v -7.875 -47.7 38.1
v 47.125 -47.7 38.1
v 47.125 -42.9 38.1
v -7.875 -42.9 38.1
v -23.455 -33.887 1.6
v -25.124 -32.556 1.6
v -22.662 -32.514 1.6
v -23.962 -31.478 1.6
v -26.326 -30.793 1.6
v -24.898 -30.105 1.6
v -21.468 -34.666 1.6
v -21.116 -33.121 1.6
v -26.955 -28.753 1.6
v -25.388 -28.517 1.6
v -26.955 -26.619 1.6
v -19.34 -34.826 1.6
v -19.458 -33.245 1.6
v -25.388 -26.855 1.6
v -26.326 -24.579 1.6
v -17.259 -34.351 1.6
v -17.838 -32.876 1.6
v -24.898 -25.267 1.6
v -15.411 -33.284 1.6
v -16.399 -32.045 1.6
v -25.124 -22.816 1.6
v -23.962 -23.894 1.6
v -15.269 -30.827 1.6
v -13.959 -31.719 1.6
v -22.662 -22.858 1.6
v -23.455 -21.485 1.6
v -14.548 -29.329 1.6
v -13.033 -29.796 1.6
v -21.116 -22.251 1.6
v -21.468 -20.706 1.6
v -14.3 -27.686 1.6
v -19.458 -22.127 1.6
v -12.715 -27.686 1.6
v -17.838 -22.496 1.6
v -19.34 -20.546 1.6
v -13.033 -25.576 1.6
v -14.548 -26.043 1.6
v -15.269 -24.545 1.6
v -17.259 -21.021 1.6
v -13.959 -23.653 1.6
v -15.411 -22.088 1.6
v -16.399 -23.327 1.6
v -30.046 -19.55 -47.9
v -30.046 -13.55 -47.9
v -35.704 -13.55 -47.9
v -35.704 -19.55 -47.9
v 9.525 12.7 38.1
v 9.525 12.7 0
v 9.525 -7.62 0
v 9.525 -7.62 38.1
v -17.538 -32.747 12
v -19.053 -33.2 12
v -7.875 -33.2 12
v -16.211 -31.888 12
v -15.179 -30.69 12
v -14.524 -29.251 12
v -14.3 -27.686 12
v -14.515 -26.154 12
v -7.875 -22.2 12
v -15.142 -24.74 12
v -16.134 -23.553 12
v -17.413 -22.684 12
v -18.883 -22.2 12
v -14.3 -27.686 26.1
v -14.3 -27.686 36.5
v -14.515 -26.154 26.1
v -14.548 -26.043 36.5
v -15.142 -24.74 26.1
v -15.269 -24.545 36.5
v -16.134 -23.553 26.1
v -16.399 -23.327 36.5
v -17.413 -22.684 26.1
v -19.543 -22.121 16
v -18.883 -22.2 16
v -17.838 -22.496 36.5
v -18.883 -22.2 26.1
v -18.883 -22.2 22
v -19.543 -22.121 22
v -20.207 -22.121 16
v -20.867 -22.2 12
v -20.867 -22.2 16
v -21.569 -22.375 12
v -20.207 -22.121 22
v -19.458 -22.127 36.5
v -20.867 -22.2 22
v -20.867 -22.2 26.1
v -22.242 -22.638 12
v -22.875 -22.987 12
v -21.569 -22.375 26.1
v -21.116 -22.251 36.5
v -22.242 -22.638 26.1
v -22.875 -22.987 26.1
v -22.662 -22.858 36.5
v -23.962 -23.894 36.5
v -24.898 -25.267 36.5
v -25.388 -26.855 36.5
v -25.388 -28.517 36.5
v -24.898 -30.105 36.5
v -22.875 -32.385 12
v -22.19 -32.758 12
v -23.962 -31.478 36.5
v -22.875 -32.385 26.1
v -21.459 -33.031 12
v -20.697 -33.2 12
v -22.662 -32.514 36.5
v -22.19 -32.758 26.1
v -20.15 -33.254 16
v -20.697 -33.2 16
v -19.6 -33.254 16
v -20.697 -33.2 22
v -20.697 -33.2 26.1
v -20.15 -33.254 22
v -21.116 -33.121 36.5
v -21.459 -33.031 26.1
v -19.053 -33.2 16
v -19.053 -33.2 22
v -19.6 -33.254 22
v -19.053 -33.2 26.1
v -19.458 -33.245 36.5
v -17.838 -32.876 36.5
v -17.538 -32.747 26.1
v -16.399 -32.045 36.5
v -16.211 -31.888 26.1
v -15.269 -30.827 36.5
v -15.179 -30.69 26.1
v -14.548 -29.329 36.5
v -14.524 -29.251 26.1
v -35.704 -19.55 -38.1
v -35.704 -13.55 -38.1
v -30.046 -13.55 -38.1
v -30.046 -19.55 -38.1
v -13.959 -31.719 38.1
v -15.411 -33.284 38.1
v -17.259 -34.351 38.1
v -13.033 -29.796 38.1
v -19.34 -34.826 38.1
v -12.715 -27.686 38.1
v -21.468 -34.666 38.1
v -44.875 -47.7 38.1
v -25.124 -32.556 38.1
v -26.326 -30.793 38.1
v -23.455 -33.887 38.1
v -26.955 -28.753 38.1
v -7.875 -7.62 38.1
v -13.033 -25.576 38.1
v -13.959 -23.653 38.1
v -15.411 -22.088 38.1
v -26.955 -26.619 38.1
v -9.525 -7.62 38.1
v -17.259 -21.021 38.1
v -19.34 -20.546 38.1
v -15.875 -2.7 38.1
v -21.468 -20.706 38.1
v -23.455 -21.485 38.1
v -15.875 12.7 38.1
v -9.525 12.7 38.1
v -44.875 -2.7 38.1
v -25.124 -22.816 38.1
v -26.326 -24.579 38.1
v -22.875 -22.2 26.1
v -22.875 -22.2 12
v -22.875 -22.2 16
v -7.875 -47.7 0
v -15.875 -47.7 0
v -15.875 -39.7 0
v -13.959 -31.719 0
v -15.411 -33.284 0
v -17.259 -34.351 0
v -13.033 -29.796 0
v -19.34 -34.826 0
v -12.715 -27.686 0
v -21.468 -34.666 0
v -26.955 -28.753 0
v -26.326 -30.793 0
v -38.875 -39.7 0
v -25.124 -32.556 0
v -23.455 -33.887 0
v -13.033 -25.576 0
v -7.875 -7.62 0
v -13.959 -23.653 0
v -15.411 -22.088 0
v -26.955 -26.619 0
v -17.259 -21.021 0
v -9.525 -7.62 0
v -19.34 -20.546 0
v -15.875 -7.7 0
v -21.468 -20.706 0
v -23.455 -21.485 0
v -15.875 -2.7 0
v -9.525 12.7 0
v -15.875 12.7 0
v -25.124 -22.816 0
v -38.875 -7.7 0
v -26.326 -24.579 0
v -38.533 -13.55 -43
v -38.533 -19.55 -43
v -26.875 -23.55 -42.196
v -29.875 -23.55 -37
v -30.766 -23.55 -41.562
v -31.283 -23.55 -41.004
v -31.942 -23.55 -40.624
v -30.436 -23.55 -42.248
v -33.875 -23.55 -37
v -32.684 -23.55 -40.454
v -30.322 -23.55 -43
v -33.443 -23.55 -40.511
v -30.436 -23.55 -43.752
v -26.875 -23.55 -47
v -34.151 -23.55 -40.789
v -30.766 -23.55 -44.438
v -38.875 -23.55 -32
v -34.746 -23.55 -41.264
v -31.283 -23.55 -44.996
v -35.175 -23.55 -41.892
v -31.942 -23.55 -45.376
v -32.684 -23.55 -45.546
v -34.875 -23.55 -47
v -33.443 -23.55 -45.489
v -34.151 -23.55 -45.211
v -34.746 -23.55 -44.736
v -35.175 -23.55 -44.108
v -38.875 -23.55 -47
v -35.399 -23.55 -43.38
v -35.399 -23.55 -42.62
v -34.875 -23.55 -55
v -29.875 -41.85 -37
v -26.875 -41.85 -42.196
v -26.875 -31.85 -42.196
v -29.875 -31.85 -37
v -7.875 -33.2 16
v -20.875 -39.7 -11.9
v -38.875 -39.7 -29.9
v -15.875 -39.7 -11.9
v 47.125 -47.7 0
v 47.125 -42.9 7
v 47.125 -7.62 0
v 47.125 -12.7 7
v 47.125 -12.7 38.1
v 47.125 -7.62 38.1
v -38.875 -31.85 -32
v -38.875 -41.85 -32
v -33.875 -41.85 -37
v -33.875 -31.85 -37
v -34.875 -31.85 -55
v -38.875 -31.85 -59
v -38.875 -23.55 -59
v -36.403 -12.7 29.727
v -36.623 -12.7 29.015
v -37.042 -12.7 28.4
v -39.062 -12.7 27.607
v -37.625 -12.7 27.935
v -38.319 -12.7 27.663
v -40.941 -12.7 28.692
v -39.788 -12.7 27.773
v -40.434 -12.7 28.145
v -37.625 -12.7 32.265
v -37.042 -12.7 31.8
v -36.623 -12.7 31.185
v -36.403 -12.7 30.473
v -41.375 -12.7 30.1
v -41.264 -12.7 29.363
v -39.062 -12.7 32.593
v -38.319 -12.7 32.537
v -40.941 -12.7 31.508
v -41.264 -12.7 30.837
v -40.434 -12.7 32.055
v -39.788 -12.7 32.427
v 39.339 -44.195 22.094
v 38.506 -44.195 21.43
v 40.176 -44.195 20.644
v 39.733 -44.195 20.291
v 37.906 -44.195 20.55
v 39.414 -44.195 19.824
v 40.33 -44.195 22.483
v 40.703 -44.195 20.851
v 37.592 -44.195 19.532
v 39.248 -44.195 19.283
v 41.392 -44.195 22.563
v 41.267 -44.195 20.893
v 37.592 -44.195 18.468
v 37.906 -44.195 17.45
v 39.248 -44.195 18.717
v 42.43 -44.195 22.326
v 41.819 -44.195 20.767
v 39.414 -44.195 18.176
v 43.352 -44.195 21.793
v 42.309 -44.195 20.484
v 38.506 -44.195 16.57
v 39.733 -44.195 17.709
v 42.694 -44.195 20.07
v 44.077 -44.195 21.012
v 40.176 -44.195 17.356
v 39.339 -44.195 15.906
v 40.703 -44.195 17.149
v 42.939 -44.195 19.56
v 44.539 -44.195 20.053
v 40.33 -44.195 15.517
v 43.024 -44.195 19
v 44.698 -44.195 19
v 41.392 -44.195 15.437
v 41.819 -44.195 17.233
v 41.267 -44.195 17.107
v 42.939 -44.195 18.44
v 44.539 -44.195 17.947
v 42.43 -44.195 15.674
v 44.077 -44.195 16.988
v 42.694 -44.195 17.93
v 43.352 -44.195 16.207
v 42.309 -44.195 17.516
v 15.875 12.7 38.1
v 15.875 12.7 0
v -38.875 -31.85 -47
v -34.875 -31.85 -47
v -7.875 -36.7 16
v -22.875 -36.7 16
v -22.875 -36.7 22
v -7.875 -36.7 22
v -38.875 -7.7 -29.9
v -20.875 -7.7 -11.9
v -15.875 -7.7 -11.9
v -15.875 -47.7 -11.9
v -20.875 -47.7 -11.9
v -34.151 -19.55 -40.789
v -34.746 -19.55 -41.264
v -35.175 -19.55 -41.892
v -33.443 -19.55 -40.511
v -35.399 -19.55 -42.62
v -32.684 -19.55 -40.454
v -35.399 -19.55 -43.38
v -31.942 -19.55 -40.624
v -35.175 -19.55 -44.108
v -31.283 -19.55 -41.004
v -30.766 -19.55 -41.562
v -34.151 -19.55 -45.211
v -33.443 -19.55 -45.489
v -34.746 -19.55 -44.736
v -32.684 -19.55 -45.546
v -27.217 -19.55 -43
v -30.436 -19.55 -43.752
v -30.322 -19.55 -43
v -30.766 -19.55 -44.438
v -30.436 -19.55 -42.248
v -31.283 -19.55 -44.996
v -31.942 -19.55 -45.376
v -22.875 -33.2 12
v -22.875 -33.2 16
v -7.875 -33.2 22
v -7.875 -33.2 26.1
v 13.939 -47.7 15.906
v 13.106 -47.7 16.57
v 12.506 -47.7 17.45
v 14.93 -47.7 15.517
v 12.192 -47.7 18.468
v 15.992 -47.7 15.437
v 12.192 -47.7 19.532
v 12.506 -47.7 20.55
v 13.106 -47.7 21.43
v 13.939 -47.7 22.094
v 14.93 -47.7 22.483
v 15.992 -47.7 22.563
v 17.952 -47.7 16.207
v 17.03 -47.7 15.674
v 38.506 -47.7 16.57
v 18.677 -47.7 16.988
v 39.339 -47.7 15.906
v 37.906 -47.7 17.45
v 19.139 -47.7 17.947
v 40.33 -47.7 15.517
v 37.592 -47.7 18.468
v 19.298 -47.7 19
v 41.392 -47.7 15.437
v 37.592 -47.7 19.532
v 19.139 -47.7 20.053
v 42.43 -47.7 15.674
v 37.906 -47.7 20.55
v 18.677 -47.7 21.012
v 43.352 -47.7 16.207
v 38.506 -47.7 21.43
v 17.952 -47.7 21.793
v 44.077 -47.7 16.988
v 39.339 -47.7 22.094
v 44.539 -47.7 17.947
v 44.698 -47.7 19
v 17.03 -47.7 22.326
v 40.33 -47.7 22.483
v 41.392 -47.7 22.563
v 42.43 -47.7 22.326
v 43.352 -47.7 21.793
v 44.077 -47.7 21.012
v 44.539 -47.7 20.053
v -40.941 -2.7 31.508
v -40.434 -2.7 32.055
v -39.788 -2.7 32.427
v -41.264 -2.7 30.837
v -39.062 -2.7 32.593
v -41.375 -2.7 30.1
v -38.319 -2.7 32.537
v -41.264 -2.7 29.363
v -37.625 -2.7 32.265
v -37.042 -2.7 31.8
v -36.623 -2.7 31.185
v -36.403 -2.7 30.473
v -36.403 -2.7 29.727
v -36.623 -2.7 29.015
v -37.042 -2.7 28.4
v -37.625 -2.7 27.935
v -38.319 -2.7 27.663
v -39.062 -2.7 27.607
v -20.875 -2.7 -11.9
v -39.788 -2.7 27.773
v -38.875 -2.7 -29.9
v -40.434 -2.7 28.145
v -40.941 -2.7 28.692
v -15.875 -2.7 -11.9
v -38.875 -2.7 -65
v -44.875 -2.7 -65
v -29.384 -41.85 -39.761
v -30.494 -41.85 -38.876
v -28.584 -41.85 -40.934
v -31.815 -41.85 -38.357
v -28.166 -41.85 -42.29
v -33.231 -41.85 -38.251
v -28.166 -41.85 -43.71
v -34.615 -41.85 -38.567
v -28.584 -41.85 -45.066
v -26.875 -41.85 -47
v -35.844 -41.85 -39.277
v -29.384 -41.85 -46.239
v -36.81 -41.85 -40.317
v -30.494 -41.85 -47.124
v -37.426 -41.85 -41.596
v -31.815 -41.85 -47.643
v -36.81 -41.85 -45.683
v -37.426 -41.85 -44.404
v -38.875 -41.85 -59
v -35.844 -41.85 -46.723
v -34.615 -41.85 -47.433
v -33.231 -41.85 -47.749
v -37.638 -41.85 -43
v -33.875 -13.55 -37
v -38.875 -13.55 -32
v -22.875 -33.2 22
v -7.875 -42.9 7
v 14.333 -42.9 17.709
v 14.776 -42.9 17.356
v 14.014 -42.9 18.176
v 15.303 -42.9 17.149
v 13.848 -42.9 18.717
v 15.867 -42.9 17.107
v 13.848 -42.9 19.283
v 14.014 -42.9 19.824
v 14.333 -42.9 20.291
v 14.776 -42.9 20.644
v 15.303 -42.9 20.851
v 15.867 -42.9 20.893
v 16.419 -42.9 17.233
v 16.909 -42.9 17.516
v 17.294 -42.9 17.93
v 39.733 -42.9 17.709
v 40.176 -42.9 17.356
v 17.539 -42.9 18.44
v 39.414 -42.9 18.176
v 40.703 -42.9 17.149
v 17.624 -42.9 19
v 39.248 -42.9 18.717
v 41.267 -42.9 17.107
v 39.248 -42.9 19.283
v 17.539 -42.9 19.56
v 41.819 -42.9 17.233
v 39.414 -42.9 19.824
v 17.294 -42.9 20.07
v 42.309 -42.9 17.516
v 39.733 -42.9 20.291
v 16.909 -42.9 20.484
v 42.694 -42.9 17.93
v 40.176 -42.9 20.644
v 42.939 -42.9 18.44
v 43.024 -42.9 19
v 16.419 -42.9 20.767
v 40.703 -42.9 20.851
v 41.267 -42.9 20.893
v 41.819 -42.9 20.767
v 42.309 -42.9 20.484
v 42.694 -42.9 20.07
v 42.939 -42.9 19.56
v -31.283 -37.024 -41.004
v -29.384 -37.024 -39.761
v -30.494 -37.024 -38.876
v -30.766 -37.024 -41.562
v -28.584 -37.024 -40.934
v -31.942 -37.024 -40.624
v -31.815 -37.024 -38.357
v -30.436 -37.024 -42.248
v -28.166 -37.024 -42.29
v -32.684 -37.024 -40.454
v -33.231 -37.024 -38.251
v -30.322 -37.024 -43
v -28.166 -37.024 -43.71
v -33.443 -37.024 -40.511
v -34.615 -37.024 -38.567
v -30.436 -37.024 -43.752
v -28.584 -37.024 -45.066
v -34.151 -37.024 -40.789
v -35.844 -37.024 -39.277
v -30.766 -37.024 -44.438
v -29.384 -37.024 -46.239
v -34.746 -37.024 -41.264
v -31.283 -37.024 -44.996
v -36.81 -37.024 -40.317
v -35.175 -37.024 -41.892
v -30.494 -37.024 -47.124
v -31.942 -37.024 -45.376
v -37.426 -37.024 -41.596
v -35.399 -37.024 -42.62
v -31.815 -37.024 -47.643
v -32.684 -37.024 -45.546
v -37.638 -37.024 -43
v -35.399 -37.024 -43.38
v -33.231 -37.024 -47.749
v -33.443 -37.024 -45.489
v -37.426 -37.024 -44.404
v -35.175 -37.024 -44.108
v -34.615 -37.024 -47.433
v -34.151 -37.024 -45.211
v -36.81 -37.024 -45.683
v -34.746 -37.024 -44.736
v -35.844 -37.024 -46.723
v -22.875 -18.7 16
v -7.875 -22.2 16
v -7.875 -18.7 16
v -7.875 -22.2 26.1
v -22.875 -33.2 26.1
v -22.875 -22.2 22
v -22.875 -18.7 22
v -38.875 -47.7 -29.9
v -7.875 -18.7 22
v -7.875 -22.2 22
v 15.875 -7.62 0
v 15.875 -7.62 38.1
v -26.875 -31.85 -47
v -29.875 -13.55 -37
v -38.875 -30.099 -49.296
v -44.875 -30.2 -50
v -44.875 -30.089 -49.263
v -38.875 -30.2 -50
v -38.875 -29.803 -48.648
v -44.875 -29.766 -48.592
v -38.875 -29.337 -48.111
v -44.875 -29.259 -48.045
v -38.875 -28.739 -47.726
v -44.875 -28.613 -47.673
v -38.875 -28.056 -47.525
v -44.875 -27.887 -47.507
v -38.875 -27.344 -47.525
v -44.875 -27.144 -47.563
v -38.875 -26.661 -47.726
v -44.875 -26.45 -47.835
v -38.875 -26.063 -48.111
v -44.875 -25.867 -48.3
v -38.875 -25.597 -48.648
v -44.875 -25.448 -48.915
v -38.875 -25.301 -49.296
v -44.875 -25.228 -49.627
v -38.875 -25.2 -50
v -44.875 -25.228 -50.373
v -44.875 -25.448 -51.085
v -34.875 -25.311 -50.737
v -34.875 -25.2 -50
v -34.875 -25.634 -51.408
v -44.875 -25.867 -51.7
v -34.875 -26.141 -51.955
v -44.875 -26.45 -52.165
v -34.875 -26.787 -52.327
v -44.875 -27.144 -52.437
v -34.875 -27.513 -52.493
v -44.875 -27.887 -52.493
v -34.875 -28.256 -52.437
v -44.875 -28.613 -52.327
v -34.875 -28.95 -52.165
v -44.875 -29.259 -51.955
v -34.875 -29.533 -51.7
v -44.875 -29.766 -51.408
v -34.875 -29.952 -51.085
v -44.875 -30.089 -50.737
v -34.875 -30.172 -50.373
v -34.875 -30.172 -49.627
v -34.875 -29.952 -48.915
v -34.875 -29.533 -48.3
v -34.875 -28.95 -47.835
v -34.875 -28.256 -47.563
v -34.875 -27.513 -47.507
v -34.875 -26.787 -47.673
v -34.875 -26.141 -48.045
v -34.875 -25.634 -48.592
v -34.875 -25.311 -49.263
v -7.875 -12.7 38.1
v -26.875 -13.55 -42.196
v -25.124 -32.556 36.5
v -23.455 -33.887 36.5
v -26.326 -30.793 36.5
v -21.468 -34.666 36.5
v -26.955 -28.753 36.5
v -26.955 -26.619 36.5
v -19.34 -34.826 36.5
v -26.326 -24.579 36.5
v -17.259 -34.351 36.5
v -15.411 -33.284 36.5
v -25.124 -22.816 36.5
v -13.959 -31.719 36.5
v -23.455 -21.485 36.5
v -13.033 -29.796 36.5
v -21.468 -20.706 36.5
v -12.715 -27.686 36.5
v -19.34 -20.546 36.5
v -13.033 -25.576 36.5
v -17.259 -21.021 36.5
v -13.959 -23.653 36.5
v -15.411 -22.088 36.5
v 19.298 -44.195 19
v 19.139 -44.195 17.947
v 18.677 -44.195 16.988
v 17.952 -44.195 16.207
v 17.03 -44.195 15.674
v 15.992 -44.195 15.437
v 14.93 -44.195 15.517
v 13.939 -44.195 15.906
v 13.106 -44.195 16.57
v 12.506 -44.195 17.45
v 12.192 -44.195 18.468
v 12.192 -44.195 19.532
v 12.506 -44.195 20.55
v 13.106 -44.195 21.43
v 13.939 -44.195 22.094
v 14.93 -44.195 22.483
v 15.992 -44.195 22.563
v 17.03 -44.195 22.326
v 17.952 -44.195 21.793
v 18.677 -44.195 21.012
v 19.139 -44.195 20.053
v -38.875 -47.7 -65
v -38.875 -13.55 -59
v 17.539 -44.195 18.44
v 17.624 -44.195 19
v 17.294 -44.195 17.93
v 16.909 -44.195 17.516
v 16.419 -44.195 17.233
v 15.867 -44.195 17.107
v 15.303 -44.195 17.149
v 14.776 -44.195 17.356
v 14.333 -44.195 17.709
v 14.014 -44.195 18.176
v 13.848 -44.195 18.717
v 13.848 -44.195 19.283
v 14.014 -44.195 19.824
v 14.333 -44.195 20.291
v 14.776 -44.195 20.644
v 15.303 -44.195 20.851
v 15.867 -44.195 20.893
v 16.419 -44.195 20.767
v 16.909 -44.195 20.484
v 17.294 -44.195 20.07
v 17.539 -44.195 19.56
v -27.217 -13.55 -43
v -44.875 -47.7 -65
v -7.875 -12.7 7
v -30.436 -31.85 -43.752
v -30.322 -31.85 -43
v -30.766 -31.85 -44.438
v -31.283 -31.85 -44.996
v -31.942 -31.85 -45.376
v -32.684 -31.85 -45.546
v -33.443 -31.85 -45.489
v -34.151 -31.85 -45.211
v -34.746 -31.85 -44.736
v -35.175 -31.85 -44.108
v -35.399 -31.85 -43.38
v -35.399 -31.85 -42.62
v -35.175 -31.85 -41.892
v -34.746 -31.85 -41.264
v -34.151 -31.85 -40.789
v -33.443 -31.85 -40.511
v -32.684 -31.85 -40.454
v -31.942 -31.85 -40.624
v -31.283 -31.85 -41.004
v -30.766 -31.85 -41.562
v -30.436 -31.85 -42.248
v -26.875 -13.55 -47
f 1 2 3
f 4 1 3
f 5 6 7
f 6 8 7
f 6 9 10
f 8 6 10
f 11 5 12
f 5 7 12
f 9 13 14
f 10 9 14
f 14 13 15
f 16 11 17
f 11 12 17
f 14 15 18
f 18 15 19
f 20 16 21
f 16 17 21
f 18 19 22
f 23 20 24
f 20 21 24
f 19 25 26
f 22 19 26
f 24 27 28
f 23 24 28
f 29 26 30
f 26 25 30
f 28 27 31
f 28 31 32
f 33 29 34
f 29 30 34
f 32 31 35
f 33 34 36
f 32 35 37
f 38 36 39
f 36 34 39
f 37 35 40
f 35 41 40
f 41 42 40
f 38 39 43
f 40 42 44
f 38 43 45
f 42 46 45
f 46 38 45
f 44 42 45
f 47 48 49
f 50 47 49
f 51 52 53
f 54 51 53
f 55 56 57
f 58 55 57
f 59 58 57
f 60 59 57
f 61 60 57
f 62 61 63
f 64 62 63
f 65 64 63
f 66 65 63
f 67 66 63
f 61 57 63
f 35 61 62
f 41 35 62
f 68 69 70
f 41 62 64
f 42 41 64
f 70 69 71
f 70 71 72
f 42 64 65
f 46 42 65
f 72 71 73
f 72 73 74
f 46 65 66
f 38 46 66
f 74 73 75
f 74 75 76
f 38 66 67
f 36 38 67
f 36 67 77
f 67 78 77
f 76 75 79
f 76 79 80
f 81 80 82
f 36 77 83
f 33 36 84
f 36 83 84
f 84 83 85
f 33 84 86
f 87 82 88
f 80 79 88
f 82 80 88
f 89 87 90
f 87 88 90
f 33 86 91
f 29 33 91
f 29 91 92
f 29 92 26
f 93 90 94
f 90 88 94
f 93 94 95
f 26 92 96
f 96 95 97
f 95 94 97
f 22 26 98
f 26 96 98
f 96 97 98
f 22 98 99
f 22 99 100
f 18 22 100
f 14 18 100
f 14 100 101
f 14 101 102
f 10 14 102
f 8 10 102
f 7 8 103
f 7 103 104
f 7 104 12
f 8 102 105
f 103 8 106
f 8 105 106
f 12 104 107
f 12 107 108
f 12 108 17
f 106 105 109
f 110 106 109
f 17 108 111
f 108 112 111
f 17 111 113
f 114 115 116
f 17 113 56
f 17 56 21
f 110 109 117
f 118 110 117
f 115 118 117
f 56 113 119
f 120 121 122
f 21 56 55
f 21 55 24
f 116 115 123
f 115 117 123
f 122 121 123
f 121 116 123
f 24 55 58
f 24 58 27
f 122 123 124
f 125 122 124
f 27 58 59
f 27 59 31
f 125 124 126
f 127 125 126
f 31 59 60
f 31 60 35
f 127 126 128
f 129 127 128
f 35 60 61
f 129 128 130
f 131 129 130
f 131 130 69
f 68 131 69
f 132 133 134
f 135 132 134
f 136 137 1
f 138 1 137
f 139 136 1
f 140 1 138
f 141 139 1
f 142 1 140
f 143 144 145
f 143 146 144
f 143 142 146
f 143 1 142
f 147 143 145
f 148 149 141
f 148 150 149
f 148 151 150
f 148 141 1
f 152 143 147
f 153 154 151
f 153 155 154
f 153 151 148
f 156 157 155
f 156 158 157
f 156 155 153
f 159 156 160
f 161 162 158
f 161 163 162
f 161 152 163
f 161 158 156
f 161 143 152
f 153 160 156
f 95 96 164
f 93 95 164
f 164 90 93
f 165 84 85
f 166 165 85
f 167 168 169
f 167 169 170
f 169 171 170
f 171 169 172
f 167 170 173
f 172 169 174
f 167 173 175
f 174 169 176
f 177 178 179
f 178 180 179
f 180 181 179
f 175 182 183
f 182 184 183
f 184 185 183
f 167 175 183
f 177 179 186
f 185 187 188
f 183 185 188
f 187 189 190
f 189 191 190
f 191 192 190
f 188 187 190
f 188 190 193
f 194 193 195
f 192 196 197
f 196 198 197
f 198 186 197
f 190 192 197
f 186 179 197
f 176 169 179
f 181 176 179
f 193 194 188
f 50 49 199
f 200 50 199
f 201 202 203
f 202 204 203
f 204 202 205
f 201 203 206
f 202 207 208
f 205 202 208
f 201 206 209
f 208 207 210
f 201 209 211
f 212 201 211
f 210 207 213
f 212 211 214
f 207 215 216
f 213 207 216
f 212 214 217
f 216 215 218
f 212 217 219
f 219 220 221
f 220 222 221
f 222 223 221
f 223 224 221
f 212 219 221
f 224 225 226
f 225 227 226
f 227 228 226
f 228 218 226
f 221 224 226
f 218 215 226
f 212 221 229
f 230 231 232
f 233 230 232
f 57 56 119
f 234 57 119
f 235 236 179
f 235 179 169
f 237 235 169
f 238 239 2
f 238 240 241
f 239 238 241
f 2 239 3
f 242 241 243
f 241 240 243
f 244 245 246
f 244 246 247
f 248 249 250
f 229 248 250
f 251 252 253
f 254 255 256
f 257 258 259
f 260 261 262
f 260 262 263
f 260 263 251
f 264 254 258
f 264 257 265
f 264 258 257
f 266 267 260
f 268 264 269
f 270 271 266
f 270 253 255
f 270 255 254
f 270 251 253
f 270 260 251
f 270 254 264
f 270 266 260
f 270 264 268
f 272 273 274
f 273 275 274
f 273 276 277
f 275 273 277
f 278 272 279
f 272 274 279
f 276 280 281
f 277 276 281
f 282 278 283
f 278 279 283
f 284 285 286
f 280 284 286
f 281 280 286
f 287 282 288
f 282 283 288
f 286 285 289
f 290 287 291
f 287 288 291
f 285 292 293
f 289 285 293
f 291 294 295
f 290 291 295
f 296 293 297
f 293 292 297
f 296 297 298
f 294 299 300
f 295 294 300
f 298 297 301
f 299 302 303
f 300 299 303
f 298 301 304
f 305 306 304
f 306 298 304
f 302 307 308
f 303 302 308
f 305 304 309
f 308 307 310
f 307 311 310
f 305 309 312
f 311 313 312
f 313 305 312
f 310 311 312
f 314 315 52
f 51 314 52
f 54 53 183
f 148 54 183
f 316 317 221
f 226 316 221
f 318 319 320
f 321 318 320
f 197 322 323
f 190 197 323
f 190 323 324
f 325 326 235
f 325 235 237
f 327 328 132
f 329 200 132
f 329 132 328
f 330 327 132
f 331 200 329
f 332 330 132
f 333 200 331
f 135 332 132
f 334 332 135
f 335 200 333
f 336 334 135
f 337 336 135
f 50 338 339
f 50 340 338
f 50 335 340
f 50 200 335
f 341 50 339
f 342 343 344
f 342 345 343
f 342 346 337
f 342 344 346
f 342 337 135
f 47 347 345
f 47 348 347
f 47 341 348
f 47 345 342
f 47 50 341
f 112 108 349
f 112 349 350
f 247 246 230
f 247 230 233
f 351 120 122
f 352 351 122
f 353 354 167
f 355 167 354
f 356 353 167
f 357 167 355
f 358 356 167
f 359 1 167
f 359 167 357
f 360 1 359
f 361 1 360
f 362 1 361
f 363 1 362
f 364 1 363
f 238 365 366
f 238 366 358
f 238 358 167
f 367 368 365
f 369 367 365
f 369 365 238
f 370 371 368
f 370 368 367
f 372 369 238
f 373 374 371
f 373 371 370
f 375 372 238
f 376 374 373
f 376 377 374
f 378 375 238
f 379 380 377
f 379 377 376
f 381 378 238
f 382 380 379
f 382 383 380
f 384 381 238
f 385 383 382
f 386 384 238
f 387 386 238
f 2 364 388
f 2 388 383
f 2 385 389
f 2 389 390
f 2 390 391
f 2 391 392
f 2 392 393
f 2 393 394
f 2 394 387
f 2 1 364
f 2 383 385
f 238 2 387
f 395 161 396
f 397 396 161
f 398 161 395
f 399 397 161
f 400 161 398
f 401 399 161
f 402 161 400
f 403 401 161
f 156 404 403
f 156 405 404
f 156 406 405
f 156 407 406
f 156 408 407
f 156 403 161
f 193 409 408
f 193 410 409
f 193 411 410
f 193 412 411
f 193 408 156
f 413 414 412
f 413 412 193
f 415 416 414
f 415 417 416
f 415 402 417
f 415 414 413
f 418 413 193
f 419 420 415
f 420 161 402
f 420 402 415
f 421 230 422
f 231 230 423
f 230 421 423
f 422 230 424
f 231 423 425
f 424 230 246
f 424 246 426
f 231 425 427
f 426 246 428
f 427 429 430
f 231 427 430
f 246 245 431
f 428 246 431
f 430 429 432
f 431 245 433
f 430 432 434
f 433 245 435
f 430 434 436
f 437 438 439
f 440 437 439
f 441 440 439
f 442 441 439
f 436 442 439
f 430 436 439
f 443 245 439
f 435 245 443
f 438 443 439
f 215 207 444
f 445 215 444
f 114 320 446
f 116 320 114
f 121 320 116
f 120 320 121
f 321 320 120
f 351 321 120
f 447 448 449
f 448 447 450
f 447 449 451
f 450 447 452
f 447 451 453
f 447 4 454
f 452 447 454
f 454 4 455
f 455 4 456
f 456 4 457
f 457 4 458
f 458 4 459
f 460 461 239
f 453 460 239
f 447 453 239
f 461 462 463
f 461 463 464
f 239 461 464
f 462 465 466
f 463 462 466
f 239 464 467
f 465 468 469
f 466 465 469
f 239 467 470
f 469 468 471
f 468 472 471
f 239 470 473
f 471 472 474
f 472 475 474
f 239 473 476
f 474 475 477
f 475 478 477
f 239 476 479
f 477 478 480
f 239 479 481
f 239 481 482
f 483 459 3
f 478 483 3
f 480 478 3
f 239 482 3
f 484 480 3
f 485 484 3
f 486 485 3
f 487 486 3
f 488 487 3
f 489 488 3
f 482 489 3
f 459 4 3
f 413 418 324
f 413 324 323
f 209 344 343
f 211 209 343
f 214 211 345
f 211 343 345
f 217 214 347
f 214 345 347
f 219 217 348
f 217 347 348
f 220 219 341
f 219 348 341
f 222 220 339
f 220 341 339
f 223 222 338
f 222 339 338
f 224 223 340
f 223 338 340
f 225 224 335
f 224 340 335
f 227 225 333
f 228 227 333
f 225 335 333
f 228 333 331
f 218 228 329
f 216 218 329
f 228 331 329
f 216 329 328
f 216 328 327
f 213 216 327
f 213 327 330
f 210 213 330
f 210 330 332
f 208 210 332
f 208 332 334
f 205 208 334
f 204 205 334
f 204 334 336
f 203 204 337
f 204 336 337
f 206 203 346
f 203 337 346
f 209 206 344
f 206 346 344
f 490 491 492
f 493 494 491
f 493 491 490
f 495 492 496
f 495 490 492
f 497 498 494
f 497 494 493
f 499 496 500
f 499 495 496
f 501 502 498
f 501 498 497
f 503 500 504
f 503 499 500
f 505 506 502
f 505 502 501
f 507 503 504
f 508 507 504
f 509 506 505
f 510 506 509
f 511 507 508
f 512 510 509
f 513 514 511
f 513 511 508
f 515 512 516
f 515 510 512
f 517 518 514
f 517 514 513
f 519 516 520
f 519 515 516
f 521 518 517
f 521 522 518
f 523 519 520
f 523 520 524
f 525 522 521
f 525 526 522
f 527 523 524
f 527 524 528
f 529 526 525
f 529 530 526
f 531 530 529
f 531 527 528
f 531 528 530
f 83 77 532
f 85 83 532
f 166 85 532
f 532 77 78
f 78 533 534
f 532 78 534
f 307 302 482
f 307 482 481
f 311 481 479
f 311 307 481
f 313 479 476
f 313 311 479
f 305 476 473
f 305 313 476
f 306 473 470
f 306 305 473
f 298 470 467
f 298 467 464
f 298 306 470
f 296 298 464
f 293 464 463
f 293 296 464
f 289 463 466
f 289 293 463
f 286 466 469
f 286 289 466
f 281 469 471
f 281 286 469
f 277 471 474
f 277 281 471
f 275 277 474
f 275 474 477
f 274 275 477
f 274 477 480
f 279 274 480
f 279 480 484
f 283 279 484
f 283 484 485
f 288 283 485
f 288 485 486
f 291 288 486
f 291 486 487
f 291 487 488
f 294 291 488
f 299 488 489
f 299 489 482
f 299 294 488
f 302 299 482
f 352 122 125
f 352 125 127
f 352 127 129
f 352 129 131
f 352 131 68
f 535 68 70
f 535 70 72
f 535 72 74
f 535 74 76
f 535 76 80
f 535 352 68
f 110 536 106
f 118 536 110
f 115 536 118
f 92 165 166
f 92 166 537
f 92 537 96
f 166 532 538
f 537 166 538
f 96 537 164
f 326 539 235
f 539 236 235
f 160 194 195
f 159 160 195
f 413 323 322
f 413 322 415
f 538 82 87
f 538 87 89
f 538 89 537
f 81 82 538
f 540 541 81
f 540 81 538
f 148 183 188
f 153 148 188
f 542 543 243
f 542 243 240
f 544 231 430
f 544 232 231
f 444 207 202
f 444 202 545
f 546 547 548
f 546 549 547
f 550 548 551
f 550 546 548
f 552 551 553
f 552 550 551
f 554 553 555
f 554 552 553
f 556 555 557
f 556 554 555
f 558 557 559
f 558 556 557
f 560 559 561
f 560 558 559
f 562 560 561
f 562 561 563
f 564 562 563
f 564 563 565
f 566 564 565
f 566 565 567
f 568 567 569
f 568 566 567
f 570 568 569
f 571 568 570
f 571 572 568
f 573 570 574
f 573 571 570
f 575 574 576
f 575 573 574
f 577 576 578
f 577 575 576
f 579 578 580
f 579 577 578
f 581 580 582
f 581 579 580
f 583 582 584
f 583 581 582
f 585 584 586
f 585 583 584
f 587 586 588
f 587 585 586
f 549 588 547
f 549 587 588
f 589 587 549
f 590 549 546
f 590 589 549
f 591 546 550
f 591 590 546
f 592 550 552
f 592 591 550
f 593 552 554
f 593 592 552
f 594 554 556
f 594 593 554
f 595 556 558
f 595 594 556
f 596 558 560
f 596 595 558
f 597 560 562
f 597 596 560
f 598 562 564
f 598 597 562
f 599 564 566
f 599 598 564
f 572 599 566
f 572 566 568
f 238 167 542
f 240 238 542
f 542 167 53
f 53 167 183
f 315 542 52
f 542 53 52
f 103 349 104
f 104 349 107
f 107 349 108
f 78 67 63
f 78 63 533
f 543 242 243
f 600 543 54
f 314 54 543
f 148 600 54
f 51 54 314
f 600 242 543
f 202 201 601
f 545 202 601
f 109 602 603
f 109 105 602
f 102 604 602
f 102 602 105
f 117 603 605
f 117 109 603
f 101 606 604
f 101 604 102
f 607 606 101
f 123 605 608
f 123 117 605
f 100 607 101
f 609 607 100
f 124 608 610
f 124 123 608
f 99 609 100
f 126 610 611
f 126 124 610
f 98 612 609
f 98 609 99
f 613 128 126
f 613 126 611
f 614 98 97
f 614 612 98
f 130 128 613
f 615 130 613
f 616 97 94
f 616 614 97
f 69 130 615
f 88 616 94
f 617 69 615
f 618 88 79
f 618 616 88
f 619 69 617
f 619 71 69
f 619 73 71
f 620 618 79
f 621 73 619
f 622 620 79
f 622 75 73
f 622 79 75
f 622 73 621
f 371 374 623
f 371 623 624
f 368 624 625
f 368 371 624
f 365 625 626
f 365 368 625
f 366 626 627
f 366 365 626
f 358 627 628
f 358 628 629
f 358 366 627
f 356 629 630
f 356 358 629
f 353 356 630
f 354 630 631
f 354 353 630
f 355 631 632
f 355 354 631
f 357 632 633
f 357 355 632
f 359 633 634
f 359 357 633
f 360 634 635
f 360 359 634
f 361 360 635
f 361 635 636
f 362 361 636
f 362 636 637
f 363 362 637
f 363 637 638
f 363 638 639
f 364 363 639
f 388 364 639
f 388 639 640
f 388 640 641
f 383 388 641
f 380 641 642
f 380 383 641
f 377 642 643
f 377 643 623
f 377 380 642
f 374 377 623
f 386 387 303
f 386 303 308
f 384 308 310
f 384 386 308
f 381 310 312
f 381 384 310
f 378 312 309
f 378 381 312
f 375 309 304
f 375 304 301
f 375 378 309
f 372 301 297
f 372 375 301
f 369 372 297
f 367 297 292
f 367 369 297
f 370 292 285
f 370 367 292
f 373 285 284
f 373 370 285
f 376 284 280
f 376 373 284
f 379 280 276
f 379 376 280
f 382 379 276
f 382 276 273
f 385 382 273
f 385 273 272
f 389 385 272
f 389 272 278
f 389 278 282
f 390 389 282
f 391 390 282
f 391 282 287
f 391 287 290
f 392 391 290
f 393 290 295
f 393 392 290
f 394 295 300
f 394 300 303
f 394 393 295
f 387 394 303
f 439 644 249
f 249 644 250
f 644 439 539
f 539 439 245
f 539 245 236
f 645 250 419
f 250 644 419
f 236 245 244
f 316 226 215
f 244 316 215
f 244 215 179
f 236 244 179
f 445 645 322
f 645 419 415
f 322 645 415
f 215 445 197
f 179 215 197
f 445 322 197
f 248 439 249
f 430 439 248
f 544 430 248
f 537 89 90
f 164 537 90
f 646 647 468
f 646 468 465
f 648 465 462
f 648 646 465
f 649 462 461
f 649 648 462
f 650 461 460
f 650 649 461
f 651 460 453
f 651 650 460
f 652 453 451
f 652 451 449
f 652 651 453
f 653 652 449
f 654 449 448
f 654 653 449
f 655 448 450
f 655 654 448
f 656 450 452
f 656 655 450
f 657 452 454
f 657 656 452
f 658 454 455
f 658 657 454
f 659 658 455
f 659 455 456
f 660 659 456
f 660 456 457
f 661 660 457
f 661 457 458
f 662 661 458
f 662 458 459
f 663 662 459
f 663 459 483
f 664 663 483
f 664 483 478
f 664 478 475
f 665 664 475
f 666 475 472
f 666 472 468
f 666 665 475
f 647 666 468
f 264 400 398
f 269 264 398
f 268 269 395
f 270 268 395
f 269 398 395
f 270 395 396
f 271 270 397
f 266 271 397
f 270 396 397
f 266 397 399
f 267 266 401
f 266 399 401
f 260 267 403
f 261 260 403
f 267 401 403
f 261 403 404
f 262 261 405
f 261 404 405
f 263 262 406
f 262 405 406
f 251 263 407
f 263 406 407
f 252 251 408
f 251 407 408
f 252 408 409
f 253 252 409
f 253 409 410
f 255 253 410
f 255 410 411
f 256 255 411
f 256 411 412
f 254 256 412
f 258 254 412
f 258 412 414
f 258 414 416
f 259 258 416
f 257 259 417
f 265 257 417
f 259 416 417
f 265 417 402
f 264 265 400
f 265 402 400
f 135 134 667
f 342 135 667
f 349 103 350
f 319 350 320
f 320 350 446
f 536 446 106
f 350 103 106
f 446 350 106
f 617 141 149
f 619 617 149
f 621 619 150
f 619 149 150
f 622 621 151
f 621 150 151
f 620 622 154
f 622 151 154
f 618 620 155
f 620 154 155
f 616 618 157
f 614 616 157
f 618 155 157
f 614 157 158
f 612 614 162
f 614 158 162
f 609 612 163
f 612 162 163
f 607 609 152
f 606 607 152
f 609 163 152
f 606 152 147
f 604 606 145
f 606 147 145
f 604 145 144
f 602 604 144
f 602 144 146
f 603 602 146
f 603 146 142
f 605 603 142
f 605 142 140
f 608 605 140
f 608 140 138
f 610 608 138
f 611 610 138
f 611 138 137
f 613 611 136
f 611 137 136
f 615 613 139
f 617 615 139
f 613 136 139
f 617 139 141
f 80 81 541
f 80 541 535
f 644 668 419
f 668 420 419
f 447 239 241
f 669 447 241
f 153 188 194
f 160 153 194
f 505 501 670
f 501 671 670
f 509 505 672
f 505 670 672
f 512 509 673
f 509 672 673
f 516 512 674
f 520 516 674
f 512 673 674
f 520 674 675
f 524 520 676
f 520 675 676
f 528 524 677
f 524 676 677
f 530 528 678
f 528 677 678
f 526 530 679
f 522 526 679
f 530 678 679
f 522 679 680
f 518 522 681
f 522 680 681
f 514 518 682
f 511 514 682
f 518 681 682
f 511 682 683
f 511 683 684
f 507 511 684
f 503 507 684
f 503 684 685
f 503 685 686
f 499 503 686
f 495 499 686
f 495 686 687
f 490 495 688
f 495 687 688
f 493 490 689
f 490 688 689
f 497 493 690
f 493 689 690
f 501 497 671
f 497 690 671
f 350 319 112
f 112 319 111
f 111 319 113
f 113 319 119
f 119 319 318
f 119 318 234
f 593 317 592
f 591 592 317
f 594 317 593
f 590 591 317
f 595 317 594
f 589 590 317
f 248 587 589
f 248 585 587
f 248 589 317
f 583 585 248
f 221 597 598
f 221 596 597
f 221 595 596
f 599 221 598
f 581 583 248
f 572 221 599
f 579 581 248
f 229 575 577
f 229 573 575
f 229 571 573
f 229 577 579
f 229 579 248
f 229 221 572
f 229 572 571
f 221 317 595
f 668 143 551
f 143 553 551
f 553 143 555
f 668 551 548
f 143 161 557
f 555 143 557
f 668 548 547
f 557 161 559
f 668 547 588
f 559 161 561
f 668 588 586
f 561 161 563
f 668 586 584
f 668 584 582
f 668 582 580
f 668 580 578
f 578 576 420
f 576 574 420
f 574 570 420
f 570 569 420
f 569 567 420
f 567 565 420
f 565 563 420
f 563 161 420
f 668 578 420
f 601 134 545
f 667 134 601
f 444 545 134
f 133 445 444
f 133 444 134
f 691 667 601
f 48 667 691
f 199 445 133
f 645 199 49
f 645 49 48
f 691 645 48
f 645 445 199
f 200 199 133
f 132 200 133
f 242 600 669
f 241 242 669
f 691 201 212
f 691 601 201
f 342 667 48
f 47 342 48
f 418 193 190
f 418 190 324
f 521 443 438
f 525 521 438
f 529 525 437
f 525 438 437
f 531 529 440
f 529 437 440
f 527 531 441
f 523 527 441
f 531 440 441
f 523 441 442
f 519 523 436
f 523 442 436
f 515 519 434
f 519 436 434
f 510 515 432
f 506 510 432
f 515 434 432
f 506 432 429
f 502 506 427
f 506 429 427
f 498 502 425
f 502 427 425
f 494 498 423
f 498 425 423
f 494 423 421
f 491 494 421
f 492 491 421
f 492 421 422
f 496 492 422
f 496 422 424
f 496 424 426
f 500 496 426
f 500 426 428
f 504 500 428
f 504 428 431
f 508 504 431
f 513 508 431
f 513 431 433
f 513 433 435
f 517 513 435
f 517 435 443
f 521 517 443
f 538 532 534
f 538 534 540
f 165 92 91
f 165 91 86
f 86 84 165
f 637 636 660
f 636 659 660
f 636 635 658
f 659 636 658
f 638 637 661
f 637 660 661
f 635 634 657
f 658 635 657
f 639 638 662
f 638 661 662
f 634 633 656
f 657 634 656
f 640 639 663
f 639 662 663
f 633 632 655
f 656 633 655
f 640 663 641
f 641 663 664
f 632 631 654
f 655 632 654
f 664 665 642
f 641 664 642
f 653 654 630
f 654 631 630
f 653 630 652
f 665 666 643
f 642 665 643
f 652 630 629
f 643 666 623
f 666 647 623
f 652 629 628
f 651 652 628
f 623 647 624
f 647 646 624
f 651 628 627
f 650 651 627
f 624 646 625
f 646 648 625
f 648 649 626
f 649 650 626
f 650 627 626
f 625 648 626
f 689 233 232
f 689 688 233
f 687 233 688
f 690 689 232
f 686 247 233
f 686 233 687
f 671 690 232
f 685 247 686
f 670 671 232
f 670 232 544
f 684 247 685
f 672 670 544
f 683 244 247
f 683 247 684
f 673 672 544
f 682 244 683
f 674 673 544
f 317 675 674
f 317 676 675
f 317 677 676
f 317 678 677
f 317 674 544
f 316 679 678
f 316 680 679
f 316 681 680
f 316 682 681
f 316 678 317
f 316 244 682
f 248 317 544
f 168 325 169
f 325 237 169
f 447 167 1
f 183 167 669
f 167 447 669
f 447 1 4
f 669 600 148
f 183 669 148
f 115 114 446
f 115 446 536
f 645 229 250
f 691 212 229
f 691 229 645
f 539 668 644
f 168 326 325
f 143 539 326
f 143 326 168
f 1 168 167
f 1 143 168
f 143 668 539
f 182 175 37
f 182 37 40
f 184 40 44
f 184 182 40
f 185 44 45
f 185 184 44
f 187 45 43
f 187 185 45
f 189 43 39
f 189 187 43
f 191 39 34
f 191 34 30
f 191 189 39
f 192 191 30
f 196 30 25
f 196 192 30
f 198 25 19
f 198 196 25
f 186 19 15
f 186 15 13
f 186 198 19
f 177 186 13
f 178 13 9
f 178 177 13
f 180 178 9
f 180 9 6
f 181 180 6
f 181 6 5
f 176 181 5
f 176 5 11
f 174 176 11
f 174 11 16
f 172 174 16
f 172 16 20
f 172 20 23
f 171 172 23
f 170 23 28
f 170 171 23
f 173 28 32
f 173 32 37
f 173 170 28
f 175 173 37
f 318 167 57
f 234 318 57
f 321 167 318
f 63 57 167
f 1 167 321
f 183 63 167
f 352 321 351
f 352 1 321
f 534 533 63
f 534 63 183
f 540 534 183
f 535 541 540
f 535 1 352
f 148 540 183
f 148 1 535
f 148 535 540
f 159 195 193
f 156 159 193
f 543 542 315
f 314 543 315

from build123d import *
from OCP.BRepFilletAPI import BRepFilletAPI_MakeChamfer

# Parameters (mm, degrees)
BOSS_EXTRUDE1_DEPTH                             = 38.1
BOSS_EXTRUDE2_DEPTH                             = 38.1
SKETCH3_R                                       = 5.575
CUT_EXTRUDE1_DEPTH                              = 74.915259757
SKETCH4_W                                       = 6
SKETCH4_H                                       = 42
BOSS_EXTRUDE3_DEPTH                             = 65
SKETCH6_W                                       = 23
SKETCH6_H                                       = 11.9
BOSS_EXTRUDE4_DEPTH                             = 5
SKETCH10_R                                      = 2.5
CUT_EXTRUDE4_DEPTH                              = 97.024228713
SKETCH12_W                                      = 14.1
SKETCH12_H                                      = 11
SKETCH12_W_2                                    = 6
SKETCH12_H_2                                    = 18
CUT_EXTRUDE5_DEPTH                              = 15
BOSS_EXTRUDE6_DEPTH                             = 3
BOSS_EXTRUDE6_DEPTH_BACK                        = 1.8
SKETCH13_W                                      = 92
SKETCH13_H                                      = 38.1
SKETCH14_R                                      = 1.5
CUT_EXTRUDE6_DEPTH                              = 4.8
SKETCH15_W                                      = 38.1
SKETCH15_H                                      = 5.08
BOSS_EXTRUDE7_DEPTH                             = 31.25
SKETCH17_R                                      = 7.16
CUT_EXTRUDE7_DEPTH                              = 1.6
SKETCH19_W                                      = 7
SKETCH19_H                                      = 40.08
BOSS_EXTRUDE9_DEPTH                             = 55
SKETCH20_W                                      = 10
SKETCH20_H                                      = 10
BOSS_EXTRUDE10_DEPTH                            = 12
CUT_EXTRUDE8_REACH                              = 99.064
SKETCH21_R                                      = 2.5
CHAMFER2_SIZE                                   = 12
BOSS_EXTRUDE11_START                            = 4
SKETCH22_W                                      = 12
SKETCH22_H                                      = 8.3
SKETCH22_R                                      = 2.5
BOSS_EXTRUDE11_DEPTH                            = 4
CHAMFER3_SIZE                                   = 4
CBORE_FOR_10_SOCKET_HEAD_CAP_SCREW1_D           = 5.1054
CBORE_FOR_10_SOCKET_HEAD_CAP_SCREW1_CBORE_D     = 9.525
CBORE_FOR_10_SOCKET_HEAD_CAP_SCREW1_CBORE_DEPTH = 4.826
CUT_EXTRUDE9_DEPTH                              = 6
CHAMFER7_SIZE                                   = 5
CHAMFER8_SIZE                                   = 18
CHAMFER8_OF_MIRROR2_SIZE                        = 18
BOSS_EXTRUDE12_DEPTH                            = 3
CHAMFER10_SIZE                                  = 3
CHAMFER10_SIZE2                                 = 5.196152423
CBORE_START                                     = -47.7
CBORE_FOR_6_SOCKET_HEAD_CAP_SCREW1_OUTL_R       = 3.57251
CBORE_FOR_6_SOCKET_HEAD_CAP_SCREW1_OUTL_R_2     = 1.5
CBORE_FOR_6_SOCKET_HEAD_CAP_SCREW1_DEPTH        = 3.5052
CBORE_START_2                                   = -44.1948
CBORE_FOR_6_SOCKET_HEAD_CAP_SCREW1_2_OU_R       = 1.89865
CBORE_FOR_6_SOCKET_HEAD_CAP_SCREW1_2_OU_R_2     = 1.5
CBORE_FOR_6_SOCKET_HEAD_CAP_SCREW1_2_DEPTH      = 1.2948
SKETCH11_R                                      = 2.5
CUT_EXTRUDE11_DEPTH                             = 10


# Read off the part's stored shape, not the designer's step: CBORE for #6 Socket Head Cap Screw1, Split1
with BuildPart() as part:
    # Sketch1 → Boss-Extrude1 (new body)
    with BuildSketch(Plane.XY):
        Polygon((-9.525, 7.62), (-9.525, 12.7), (-15.875, 12.7), (-15.875, -12.7), (15.875, -12.7), (15.875, 12.7), (9.525, 12.7), (9.525, 7.62), (9.525, -7.62), (-9.525, -7.62), align=None)
    extrude(amount=BOSS_EXTRUDE1_DEPTH)

    # Sketch2 → Boss-Extrude2 (add)
    with BuildSketch(Plane.XY.offset(38.1)):
        Polygon((-44.875, -44.7), (-7.875, -44.7), (-7.875, -12.7), (-15.875, -12.7), (-15.875, -2.7), (-44.875, -2.7), align=None)
    extrude(amount=-BOSS_EXTRUDE2_DEPTH)

    # Sketch3 → Cut-Extrude1 (cut, through all)
    with BuildSketch(Plane.XY.offset(38.1)):
        with Locations((-19.875, -27.686)):
            Circle(SKETCH3_R)
    extrude(amount=-CUT_EXTRUDE1_DEPTH, mode=Mode.SUBTRACT)

    # Sketch4 → Boss-Extrude3 (add)
    with BuildSketch(Plane(origin=(0, 0, 0), x_dir=(-1, 0, 0), z_dir=(0, 0, -1))):
        with Locations((41.875, -23.7)):
            Rectangle(SKETCH4_W, SKETCH4_H)
    extrude(amount=BOSS_EXTRUDE3_DEPTH)

    # Sketch6 → Boss-Extrude4 (add)
    with BuildSketch(Plane(origin=(0, -2.7, 0), x_dir=(1, 0, 0), z_dir=(0, 1, 0))):
        with Locations((-27.375, 5.95)):
            Rectangle(SKETCH6_W, SKETCH6_H)
        Polygon((-38.875, 0), (-38.875, 11.9), (-44.875, 11.9), (-44.875, -38.1), (-15.875, -38.1), (-15.875, 0), align=None)
    boss_extrude4 = extrude(amount=-BOSS_EXTRUDE4_DEPTH)

    # Sketch10 → Cut-Extrude4 (cut, through all)
    with BuildSketch(Plane.ZY.offset(38.875)):
        with Locations(Location((-50, -27.7, 0), (0, 0, 270))):
            Circle(SKETCH10_R)
    extrude(amount=CUT_EXTRUDE4_DEPTH, mode=Mode.SUBTRACT)

    # Sketch12 → Cut-Extrude5 (cut)
    with BuildSketch(Plane(origin=(-7.875, 0, 58.8), x_dir=(0, 0, 1), z_dir=(-1, 0, 0))):
        with Locations((-39.75, -27.7)):
            Rectangle(SKETCH12_W, SKETCH12_H)
        with Locations((-39.8, -27.7)):
            Rectangle(SKETCH12_W_2, SKETCH12_H_2)
    extrude(amount=CUT_EXTRUDE5_DEPTH, mode=Mode.SUBTRACT)

    # Sketch13 → Boss-Extrude6 (add, two sides: drawn at the far end of the back side and taken through both)
    with BuildSketch(Plane.XZ.offset(44.7).offset(-BOSS_EXTRUDE6_DEPTH_BACK)):
        with Locations((1.125, 19.05)):
            Rectangle(SKETCH13_W, SKETCH13_H)
    extrude(amount=BOSS_EXTRUDE6_DEPTH + BOSS_EXTRUDE6_DEPTH_BACK)

    # Sketch14 → Cut-Extrude6 (cut)
    with BuildSketch(Plane.XZ.offset(47.7)):
        with Locations(Location((15.725, 19, 0), (0, 0, 270))):
            Circle(SKETCH14_R)
        with Locations(Location((41.125, 19, 0), (0, 0, 270))):
            Circle(SKETCH14_R)
    extrude(amount=-CUT_EXTRUDE6_DEPTH, mode=Mode.SUBTRACT)

    # Sketch15 → Boss-Extrude7 (add)
    with BuildSketch(Plane(origin=(15.875, 0, 0), x_dir=(0, 0, -1), z_dir=(1, 0, 0))):
        with Locations((-19.05, -10.16)):
            Rectangle(SKETCH15_W, SKETCH15_H)
    extrude(amount=BOSS_EXTRUDE7_DEPTH)

    # Sketch17 → Cut-Extrude7 (cut)
    with BuildSketch(Plane.XY.offset(38.1)):
        with Locations((-19.875, -27.686)):
            Circle(SKETCH17_R)
    cut_extrude7 = extrude(amount=-CUT_EXTRUDE7_DEPTH, mode=Mode.SUBTRACT)

    # Mirror1: Cut-Extrude7 across plane
    add(cut_extrude7.mirror(Plane.XY.offset(19.05)), mode=Mode.SUBTRACT)

    # Sketch19 → Boss-Extrude9 (add)
    with BuildSketch(Plane(origin=(47.125, 0, 0), x_dir=(0, 0, -1), z_dir=(1, 0, 0))):
        with Locations((-3.5, -27.66)):
            Rectangle(SKETCH19_W, SKETCH19_H)
    extrude(amount=-BOSS_EXTRUDE9_DEPTH)

    # Sketch20 → Boss-Extrude10 (add)
    with BuildSketch(Plane(origin=(-38.875, 0, 0), x_dir=(0, 0, -1), z_dir=(1, 0, 0))):
        with Locations((42, -36.85)):
            Rectangle(SKETCH20_W, SKETCH20_H)
        with Locations((42, -18.55)):
            Rectangle(SKETCH20_W, SKETCH20_H)
    extrude(amount=BOSS_EXTRUDE10_DEPTH)

    # Cut-Extrude8: up to this face of the body (flat: up to its plane)
    cut_extrude8_end = Plane(part.part.faces().sort_by_distance((-32.875, -13.55, -42))[0])
    # Sketch21 → Cut-Extrude8 (cut, up to the picked face)
    with BuildSketch(Plane.XZ.offset(41.85), mode=Mode.PRIVATE) as cut_extrude8_sk1:
        with Locations((-32.875, -43)):
            Circle(SKETCH21_R)
    cut_extrude8_tool1 = split(extrude(cut_extrude8_sk1.sketch, amount=-CUT_EXTRUDE8_REACH, mode=Mode.PRIVATE), bisect_by=cut_extrude8_end, keep=Keep.BOTH, mode=Mode.PRIVATE)
    add(cut_extrude8_tool1.solids().sort_by(Axis((-32.875, -41.85, -43), (0, 1, 0)))[0], mode=Mode.SUBTRACT)

    # Chamfer2
    chamfer2_edges = [part.edges().sort_by_distance(p)[0] for p in [
        (-38.875, -18.55, -47),
        (-38.875, -36.85, -47),
    ]]
    chamfer(chamfer2_edges, length=CHAMFER2_SIZE - 0.0001)  # a hair under: the kernel refuses the full size

    # Sketch22 → Boss-Extrude11 (add)
    with BuildSketch(Plane(origin=(-38.875, 0, 0), x_dir=(0, 0, -1), z_dir=(1, 0, 0)).offset(BOSS_EXTRUDE11_START)):
        with Locations((53, -27.7)):
            Rectangle(SKETCH22_W, SKETCH22_H)
        with Locations(Location((50, -27.7, 0), (0, 0, 90))):
            Circle(SKETCH22_R, mode=Mode.SUBTRACT)
    extrude(amount=-BOSS_EXTRUDE11_DEPTH)

    # Chamfer3
    chamfer3_edges = [part.edges().sort_by_distance(p)[0] for p in [
        (-34.875, -27.7, -59),
    ]]
    chamfer(chamfer3_edges, length=CHAMFER3_SIZE - 0.0001)  # a hair under: the kernel refuses the full size

    # CBORE for #10 Socket Head Cap Screw1 (through all)
    with Locations(Plane(origin=(0, -41.85, 0), x_dir=(-1, 0, 0), z_dir=(0, -1, 0))):
        with Locations((32.875, 43)):
            CounterBoreHole(CBORE_FOR_10_SOCKET_HEAD_CAP_SCREW1_D / 2, CBORE_FOR_10_SOCKET_HEAD_CAP_SCREW1_CBORE_D / 2, CBORE_FOR_10_SOCKET_HEAD_CAP_SCREW1_CBORE_DEPTH)

    # Sketch25 → Cut-Extrude9 (cut)
    with BuildSketch(Plane(origin=(0, -13.55, 0), x_dir=(1, 0, 0), z_dir=(0, 1, 0))):
        Polygon((-35.704016319, 38.1), (-30.045983681, 38.1), (-27.216967362, 43), (-30.045983681, 47.9), (-35.704016319, 47.9), (-38.533032638, 43), align=None)
    extrude(amount=-CUT_EXTRUDE9_DEPTH, mode=Mode.SUBTRACT)

    # Chamfer7
    chamfer7_edges = [part.edges().sort_by_distance(p)[0] for p in [
        (-38.875, -36.85, -37),
        (-38.875, -18.55, -37),
    ]]
    chamfer(chamfer7_edges, length=CHAMFER7_SIZE)

    # Chamfer8
    chamfer8_edges = [part.edges().sort_by_distance(p)[0] for p in [
        (-38.875, -5.2, -11.9),
    ]]
    chamfer(chamfer8_edges, length=CHAMFER8_SIZE)

    # Mirror2: Boss-Extrude4 across plane
    add(boss_extrude4.mirror(Plane(origin=(0, -23.7, 0), x_dir=(0, 0, 1), z_dir=(0, -1, 0))))

    # Chamfer8 of Mirror2
    chamfer8_of_mirror2_edges = [part.edges().sort_by_distance(p)[0] for p in [
        (-38.875, -42.2, -11.9),
    ]]
    chamfer(chamfer8_of_mirror2_edges, length=CHAMFER8_OF_MIRROR2_SIZE)

    # Sketch27 → Boss-Extrude12 (add)
    with BuildSketch(Plane.XZ.offset(44.7)):
        Polygon((-15.875, 0), (-44.875, 0), (-44.875, -65), (-38.875, -65), (-38.875, -29.9), (-20.875, -11.9), (-15.875, -11.9), align=None)
    extrude(amount=BOSS_EXTRUDE12_DEPTH)

    # Chamfer10: one chamfer whose edges measure the first distance from different faces: ONE call of the kernel's chamfer builder (chamfer() names one face for all edges)
    chamfer10_edges_1 = [part.edges().sort_by_distance(p)[0] for p in [
        (-26.875, -36.85, -37),
    ]]
    chamfer10_side_1 = [part.faces().sort_by_distance(p)[0] for p in [
        (-30.375, -36.85, -37),
    ]]
    chamfer10_edges_2 = [part.edges().sort_by_distance(p)[0] for p in [
        (-26.875, -18.55, -37),
    ]]
    chamfer10_side_2 = [part.faces().sort_by_distance(p)[0] for p in [
        (-30.375, -18.55, -37),
    ]]
    chamfer10 = BRepFilletAPI_MakeChamfer(part.part.solid().wrapped)
    for e in chamfer10_edges_1:
        chamfer10.Add(CHAMFER10_SIZE, CHAMFER10_SIZE2, e.wrapped, chamfer10_side_1[0].wrapped)  # the first distance lies on this face
    for e in chamfer10_edges_2:
        chamfer10.Add(CHAMFER10_SIZE, CHAMFER10_SIZE2, e.wrapped, chamfer10_side_2[0].wrapped)  # the first distance lies on this face
    add(Compound.cast(chamfer10.Shape()), mode=Mode.REPLACE)

    # CBORE for #6 Socket Head Cap Screw1 outl → CBORE for #6 Socket Head Cap Screw1 (cut)
    # profile 1 of 2: a face of its own
    with BuildSketch(Plane(origin=(0, 0, 0), x_dir=(1, 0, 0), z_dir=(0, 1, 0)).offset(CBORE_START)):
        with Locations((41.125, -19)):
            Circle(CBORE_FOR_6_SOCKET_HEAD_CAP_SCREW1_OUTL_R)
        with Locations((41.125, -19)):
            Circle(CBORE_FOR_6_SOCKET_HEAD_CAP_SCREW1_OUTL_R_2, mode=Mode.SUBTRACT)
    # profile 2 of 2: a face of its own
    with BuildSketch(Plane(origin=(0, 0, 0), x_dir=(1, 0, 0), z_dir=(0, 1, 0)).offset(CBORE_START)):
        with Locations((15.725, -19)):
            Circle(CBORE_FOR_6_SOCKET_HEAD_CAP_SCREW1_OUTL_R)
        with Locations((15.725, -19)):
            Circle(CBORE_FOR_6_SOCKET_HEAD_CAP_SCREW1_OUTL_R_2, mode=Mode.SUBTRACT)
    extrude(amount=CBORE_FOR_6_SOCKET_HEAD_CAP_SCREW1_DEPTH, mode=Mode.SUBTRACT)

    # CBORE for _6 Socket Head Cap Screw1 2 ou → CBORE for _6 Socket Head Cap Screw1 2 (cut)
    # profile 1 of 2: a face of its own
    with BuildSketch(Plane(origin=(0, 0, 0), x_dir=(1, 0, 0), z_dir=(0, 1, 0)).offset(CBORE_START_2)):
        with Locations((41.125, -19)):
            Circle(CBORE_FOR_6_SOCKET_HEAD_CAP_SCREW1_2_OU_R)
        with Locations((41.125, -19)):
            Circle(CBORE_FOR_6_SOCKET_HEAD_CAP_SCREW1_2_OU_R_2, mode=Mode.SUBTRACT)
    # profile 2 of 2: a face of its own
    with BuildSketch(Plane(origin=(0, 0, 0), x_dir=(1, 0, 0), z_dir=(0, 1, 0)).offset(CBORE_START_2)):
        with Locations((15.725, -19)):
            Circle(CBORE_FOR_6_SOCKET_HEAD_CAP_SCREW1_2_OU_R)
        with Locations((15.725, -19)):
            Circle(CBORE_FOR_6_SOCKET_HEAD_CAP_SCREW1_2_OU_R_2, mode=Mode.SUBTRACT)
    extrude(amount=CBORE_FOR_6_SOCKET_HEAD_CAP_SCREW1_2_DEPTH, mode=Mode.SUBTRACT)


with BuildPart() as body_2:
    # Split1: the piece on the far side of the plane
    add(part.part)
    split(bisect_by=Plane.YZ.offset(-7.875), keep=Keep.BOTTOM)

    # Sketch11 → Cut-Extrude11 (cut)
    with BuildSketch(Plane(origin=(0, -2.7, 0), x_dir=(1, 0, 0), z_dir=(0, 1, 0))):
        with Locations(Location((-38.875, -30.1, 0), (0, 0, 180))):
            Circle(SKETCH11_R)
    extrude(amount=-CUT_EXTRUDE11_DEPTH, mode=Mode.SUBTRACT)


with BuildPart() as part_1:
    add(part.part)

    # Split1
    split(bisect_by=Plane.YZ.offset(-7.875), keep=Keep.TOP)


solid = Compound([body_2.part, part_1.part])
